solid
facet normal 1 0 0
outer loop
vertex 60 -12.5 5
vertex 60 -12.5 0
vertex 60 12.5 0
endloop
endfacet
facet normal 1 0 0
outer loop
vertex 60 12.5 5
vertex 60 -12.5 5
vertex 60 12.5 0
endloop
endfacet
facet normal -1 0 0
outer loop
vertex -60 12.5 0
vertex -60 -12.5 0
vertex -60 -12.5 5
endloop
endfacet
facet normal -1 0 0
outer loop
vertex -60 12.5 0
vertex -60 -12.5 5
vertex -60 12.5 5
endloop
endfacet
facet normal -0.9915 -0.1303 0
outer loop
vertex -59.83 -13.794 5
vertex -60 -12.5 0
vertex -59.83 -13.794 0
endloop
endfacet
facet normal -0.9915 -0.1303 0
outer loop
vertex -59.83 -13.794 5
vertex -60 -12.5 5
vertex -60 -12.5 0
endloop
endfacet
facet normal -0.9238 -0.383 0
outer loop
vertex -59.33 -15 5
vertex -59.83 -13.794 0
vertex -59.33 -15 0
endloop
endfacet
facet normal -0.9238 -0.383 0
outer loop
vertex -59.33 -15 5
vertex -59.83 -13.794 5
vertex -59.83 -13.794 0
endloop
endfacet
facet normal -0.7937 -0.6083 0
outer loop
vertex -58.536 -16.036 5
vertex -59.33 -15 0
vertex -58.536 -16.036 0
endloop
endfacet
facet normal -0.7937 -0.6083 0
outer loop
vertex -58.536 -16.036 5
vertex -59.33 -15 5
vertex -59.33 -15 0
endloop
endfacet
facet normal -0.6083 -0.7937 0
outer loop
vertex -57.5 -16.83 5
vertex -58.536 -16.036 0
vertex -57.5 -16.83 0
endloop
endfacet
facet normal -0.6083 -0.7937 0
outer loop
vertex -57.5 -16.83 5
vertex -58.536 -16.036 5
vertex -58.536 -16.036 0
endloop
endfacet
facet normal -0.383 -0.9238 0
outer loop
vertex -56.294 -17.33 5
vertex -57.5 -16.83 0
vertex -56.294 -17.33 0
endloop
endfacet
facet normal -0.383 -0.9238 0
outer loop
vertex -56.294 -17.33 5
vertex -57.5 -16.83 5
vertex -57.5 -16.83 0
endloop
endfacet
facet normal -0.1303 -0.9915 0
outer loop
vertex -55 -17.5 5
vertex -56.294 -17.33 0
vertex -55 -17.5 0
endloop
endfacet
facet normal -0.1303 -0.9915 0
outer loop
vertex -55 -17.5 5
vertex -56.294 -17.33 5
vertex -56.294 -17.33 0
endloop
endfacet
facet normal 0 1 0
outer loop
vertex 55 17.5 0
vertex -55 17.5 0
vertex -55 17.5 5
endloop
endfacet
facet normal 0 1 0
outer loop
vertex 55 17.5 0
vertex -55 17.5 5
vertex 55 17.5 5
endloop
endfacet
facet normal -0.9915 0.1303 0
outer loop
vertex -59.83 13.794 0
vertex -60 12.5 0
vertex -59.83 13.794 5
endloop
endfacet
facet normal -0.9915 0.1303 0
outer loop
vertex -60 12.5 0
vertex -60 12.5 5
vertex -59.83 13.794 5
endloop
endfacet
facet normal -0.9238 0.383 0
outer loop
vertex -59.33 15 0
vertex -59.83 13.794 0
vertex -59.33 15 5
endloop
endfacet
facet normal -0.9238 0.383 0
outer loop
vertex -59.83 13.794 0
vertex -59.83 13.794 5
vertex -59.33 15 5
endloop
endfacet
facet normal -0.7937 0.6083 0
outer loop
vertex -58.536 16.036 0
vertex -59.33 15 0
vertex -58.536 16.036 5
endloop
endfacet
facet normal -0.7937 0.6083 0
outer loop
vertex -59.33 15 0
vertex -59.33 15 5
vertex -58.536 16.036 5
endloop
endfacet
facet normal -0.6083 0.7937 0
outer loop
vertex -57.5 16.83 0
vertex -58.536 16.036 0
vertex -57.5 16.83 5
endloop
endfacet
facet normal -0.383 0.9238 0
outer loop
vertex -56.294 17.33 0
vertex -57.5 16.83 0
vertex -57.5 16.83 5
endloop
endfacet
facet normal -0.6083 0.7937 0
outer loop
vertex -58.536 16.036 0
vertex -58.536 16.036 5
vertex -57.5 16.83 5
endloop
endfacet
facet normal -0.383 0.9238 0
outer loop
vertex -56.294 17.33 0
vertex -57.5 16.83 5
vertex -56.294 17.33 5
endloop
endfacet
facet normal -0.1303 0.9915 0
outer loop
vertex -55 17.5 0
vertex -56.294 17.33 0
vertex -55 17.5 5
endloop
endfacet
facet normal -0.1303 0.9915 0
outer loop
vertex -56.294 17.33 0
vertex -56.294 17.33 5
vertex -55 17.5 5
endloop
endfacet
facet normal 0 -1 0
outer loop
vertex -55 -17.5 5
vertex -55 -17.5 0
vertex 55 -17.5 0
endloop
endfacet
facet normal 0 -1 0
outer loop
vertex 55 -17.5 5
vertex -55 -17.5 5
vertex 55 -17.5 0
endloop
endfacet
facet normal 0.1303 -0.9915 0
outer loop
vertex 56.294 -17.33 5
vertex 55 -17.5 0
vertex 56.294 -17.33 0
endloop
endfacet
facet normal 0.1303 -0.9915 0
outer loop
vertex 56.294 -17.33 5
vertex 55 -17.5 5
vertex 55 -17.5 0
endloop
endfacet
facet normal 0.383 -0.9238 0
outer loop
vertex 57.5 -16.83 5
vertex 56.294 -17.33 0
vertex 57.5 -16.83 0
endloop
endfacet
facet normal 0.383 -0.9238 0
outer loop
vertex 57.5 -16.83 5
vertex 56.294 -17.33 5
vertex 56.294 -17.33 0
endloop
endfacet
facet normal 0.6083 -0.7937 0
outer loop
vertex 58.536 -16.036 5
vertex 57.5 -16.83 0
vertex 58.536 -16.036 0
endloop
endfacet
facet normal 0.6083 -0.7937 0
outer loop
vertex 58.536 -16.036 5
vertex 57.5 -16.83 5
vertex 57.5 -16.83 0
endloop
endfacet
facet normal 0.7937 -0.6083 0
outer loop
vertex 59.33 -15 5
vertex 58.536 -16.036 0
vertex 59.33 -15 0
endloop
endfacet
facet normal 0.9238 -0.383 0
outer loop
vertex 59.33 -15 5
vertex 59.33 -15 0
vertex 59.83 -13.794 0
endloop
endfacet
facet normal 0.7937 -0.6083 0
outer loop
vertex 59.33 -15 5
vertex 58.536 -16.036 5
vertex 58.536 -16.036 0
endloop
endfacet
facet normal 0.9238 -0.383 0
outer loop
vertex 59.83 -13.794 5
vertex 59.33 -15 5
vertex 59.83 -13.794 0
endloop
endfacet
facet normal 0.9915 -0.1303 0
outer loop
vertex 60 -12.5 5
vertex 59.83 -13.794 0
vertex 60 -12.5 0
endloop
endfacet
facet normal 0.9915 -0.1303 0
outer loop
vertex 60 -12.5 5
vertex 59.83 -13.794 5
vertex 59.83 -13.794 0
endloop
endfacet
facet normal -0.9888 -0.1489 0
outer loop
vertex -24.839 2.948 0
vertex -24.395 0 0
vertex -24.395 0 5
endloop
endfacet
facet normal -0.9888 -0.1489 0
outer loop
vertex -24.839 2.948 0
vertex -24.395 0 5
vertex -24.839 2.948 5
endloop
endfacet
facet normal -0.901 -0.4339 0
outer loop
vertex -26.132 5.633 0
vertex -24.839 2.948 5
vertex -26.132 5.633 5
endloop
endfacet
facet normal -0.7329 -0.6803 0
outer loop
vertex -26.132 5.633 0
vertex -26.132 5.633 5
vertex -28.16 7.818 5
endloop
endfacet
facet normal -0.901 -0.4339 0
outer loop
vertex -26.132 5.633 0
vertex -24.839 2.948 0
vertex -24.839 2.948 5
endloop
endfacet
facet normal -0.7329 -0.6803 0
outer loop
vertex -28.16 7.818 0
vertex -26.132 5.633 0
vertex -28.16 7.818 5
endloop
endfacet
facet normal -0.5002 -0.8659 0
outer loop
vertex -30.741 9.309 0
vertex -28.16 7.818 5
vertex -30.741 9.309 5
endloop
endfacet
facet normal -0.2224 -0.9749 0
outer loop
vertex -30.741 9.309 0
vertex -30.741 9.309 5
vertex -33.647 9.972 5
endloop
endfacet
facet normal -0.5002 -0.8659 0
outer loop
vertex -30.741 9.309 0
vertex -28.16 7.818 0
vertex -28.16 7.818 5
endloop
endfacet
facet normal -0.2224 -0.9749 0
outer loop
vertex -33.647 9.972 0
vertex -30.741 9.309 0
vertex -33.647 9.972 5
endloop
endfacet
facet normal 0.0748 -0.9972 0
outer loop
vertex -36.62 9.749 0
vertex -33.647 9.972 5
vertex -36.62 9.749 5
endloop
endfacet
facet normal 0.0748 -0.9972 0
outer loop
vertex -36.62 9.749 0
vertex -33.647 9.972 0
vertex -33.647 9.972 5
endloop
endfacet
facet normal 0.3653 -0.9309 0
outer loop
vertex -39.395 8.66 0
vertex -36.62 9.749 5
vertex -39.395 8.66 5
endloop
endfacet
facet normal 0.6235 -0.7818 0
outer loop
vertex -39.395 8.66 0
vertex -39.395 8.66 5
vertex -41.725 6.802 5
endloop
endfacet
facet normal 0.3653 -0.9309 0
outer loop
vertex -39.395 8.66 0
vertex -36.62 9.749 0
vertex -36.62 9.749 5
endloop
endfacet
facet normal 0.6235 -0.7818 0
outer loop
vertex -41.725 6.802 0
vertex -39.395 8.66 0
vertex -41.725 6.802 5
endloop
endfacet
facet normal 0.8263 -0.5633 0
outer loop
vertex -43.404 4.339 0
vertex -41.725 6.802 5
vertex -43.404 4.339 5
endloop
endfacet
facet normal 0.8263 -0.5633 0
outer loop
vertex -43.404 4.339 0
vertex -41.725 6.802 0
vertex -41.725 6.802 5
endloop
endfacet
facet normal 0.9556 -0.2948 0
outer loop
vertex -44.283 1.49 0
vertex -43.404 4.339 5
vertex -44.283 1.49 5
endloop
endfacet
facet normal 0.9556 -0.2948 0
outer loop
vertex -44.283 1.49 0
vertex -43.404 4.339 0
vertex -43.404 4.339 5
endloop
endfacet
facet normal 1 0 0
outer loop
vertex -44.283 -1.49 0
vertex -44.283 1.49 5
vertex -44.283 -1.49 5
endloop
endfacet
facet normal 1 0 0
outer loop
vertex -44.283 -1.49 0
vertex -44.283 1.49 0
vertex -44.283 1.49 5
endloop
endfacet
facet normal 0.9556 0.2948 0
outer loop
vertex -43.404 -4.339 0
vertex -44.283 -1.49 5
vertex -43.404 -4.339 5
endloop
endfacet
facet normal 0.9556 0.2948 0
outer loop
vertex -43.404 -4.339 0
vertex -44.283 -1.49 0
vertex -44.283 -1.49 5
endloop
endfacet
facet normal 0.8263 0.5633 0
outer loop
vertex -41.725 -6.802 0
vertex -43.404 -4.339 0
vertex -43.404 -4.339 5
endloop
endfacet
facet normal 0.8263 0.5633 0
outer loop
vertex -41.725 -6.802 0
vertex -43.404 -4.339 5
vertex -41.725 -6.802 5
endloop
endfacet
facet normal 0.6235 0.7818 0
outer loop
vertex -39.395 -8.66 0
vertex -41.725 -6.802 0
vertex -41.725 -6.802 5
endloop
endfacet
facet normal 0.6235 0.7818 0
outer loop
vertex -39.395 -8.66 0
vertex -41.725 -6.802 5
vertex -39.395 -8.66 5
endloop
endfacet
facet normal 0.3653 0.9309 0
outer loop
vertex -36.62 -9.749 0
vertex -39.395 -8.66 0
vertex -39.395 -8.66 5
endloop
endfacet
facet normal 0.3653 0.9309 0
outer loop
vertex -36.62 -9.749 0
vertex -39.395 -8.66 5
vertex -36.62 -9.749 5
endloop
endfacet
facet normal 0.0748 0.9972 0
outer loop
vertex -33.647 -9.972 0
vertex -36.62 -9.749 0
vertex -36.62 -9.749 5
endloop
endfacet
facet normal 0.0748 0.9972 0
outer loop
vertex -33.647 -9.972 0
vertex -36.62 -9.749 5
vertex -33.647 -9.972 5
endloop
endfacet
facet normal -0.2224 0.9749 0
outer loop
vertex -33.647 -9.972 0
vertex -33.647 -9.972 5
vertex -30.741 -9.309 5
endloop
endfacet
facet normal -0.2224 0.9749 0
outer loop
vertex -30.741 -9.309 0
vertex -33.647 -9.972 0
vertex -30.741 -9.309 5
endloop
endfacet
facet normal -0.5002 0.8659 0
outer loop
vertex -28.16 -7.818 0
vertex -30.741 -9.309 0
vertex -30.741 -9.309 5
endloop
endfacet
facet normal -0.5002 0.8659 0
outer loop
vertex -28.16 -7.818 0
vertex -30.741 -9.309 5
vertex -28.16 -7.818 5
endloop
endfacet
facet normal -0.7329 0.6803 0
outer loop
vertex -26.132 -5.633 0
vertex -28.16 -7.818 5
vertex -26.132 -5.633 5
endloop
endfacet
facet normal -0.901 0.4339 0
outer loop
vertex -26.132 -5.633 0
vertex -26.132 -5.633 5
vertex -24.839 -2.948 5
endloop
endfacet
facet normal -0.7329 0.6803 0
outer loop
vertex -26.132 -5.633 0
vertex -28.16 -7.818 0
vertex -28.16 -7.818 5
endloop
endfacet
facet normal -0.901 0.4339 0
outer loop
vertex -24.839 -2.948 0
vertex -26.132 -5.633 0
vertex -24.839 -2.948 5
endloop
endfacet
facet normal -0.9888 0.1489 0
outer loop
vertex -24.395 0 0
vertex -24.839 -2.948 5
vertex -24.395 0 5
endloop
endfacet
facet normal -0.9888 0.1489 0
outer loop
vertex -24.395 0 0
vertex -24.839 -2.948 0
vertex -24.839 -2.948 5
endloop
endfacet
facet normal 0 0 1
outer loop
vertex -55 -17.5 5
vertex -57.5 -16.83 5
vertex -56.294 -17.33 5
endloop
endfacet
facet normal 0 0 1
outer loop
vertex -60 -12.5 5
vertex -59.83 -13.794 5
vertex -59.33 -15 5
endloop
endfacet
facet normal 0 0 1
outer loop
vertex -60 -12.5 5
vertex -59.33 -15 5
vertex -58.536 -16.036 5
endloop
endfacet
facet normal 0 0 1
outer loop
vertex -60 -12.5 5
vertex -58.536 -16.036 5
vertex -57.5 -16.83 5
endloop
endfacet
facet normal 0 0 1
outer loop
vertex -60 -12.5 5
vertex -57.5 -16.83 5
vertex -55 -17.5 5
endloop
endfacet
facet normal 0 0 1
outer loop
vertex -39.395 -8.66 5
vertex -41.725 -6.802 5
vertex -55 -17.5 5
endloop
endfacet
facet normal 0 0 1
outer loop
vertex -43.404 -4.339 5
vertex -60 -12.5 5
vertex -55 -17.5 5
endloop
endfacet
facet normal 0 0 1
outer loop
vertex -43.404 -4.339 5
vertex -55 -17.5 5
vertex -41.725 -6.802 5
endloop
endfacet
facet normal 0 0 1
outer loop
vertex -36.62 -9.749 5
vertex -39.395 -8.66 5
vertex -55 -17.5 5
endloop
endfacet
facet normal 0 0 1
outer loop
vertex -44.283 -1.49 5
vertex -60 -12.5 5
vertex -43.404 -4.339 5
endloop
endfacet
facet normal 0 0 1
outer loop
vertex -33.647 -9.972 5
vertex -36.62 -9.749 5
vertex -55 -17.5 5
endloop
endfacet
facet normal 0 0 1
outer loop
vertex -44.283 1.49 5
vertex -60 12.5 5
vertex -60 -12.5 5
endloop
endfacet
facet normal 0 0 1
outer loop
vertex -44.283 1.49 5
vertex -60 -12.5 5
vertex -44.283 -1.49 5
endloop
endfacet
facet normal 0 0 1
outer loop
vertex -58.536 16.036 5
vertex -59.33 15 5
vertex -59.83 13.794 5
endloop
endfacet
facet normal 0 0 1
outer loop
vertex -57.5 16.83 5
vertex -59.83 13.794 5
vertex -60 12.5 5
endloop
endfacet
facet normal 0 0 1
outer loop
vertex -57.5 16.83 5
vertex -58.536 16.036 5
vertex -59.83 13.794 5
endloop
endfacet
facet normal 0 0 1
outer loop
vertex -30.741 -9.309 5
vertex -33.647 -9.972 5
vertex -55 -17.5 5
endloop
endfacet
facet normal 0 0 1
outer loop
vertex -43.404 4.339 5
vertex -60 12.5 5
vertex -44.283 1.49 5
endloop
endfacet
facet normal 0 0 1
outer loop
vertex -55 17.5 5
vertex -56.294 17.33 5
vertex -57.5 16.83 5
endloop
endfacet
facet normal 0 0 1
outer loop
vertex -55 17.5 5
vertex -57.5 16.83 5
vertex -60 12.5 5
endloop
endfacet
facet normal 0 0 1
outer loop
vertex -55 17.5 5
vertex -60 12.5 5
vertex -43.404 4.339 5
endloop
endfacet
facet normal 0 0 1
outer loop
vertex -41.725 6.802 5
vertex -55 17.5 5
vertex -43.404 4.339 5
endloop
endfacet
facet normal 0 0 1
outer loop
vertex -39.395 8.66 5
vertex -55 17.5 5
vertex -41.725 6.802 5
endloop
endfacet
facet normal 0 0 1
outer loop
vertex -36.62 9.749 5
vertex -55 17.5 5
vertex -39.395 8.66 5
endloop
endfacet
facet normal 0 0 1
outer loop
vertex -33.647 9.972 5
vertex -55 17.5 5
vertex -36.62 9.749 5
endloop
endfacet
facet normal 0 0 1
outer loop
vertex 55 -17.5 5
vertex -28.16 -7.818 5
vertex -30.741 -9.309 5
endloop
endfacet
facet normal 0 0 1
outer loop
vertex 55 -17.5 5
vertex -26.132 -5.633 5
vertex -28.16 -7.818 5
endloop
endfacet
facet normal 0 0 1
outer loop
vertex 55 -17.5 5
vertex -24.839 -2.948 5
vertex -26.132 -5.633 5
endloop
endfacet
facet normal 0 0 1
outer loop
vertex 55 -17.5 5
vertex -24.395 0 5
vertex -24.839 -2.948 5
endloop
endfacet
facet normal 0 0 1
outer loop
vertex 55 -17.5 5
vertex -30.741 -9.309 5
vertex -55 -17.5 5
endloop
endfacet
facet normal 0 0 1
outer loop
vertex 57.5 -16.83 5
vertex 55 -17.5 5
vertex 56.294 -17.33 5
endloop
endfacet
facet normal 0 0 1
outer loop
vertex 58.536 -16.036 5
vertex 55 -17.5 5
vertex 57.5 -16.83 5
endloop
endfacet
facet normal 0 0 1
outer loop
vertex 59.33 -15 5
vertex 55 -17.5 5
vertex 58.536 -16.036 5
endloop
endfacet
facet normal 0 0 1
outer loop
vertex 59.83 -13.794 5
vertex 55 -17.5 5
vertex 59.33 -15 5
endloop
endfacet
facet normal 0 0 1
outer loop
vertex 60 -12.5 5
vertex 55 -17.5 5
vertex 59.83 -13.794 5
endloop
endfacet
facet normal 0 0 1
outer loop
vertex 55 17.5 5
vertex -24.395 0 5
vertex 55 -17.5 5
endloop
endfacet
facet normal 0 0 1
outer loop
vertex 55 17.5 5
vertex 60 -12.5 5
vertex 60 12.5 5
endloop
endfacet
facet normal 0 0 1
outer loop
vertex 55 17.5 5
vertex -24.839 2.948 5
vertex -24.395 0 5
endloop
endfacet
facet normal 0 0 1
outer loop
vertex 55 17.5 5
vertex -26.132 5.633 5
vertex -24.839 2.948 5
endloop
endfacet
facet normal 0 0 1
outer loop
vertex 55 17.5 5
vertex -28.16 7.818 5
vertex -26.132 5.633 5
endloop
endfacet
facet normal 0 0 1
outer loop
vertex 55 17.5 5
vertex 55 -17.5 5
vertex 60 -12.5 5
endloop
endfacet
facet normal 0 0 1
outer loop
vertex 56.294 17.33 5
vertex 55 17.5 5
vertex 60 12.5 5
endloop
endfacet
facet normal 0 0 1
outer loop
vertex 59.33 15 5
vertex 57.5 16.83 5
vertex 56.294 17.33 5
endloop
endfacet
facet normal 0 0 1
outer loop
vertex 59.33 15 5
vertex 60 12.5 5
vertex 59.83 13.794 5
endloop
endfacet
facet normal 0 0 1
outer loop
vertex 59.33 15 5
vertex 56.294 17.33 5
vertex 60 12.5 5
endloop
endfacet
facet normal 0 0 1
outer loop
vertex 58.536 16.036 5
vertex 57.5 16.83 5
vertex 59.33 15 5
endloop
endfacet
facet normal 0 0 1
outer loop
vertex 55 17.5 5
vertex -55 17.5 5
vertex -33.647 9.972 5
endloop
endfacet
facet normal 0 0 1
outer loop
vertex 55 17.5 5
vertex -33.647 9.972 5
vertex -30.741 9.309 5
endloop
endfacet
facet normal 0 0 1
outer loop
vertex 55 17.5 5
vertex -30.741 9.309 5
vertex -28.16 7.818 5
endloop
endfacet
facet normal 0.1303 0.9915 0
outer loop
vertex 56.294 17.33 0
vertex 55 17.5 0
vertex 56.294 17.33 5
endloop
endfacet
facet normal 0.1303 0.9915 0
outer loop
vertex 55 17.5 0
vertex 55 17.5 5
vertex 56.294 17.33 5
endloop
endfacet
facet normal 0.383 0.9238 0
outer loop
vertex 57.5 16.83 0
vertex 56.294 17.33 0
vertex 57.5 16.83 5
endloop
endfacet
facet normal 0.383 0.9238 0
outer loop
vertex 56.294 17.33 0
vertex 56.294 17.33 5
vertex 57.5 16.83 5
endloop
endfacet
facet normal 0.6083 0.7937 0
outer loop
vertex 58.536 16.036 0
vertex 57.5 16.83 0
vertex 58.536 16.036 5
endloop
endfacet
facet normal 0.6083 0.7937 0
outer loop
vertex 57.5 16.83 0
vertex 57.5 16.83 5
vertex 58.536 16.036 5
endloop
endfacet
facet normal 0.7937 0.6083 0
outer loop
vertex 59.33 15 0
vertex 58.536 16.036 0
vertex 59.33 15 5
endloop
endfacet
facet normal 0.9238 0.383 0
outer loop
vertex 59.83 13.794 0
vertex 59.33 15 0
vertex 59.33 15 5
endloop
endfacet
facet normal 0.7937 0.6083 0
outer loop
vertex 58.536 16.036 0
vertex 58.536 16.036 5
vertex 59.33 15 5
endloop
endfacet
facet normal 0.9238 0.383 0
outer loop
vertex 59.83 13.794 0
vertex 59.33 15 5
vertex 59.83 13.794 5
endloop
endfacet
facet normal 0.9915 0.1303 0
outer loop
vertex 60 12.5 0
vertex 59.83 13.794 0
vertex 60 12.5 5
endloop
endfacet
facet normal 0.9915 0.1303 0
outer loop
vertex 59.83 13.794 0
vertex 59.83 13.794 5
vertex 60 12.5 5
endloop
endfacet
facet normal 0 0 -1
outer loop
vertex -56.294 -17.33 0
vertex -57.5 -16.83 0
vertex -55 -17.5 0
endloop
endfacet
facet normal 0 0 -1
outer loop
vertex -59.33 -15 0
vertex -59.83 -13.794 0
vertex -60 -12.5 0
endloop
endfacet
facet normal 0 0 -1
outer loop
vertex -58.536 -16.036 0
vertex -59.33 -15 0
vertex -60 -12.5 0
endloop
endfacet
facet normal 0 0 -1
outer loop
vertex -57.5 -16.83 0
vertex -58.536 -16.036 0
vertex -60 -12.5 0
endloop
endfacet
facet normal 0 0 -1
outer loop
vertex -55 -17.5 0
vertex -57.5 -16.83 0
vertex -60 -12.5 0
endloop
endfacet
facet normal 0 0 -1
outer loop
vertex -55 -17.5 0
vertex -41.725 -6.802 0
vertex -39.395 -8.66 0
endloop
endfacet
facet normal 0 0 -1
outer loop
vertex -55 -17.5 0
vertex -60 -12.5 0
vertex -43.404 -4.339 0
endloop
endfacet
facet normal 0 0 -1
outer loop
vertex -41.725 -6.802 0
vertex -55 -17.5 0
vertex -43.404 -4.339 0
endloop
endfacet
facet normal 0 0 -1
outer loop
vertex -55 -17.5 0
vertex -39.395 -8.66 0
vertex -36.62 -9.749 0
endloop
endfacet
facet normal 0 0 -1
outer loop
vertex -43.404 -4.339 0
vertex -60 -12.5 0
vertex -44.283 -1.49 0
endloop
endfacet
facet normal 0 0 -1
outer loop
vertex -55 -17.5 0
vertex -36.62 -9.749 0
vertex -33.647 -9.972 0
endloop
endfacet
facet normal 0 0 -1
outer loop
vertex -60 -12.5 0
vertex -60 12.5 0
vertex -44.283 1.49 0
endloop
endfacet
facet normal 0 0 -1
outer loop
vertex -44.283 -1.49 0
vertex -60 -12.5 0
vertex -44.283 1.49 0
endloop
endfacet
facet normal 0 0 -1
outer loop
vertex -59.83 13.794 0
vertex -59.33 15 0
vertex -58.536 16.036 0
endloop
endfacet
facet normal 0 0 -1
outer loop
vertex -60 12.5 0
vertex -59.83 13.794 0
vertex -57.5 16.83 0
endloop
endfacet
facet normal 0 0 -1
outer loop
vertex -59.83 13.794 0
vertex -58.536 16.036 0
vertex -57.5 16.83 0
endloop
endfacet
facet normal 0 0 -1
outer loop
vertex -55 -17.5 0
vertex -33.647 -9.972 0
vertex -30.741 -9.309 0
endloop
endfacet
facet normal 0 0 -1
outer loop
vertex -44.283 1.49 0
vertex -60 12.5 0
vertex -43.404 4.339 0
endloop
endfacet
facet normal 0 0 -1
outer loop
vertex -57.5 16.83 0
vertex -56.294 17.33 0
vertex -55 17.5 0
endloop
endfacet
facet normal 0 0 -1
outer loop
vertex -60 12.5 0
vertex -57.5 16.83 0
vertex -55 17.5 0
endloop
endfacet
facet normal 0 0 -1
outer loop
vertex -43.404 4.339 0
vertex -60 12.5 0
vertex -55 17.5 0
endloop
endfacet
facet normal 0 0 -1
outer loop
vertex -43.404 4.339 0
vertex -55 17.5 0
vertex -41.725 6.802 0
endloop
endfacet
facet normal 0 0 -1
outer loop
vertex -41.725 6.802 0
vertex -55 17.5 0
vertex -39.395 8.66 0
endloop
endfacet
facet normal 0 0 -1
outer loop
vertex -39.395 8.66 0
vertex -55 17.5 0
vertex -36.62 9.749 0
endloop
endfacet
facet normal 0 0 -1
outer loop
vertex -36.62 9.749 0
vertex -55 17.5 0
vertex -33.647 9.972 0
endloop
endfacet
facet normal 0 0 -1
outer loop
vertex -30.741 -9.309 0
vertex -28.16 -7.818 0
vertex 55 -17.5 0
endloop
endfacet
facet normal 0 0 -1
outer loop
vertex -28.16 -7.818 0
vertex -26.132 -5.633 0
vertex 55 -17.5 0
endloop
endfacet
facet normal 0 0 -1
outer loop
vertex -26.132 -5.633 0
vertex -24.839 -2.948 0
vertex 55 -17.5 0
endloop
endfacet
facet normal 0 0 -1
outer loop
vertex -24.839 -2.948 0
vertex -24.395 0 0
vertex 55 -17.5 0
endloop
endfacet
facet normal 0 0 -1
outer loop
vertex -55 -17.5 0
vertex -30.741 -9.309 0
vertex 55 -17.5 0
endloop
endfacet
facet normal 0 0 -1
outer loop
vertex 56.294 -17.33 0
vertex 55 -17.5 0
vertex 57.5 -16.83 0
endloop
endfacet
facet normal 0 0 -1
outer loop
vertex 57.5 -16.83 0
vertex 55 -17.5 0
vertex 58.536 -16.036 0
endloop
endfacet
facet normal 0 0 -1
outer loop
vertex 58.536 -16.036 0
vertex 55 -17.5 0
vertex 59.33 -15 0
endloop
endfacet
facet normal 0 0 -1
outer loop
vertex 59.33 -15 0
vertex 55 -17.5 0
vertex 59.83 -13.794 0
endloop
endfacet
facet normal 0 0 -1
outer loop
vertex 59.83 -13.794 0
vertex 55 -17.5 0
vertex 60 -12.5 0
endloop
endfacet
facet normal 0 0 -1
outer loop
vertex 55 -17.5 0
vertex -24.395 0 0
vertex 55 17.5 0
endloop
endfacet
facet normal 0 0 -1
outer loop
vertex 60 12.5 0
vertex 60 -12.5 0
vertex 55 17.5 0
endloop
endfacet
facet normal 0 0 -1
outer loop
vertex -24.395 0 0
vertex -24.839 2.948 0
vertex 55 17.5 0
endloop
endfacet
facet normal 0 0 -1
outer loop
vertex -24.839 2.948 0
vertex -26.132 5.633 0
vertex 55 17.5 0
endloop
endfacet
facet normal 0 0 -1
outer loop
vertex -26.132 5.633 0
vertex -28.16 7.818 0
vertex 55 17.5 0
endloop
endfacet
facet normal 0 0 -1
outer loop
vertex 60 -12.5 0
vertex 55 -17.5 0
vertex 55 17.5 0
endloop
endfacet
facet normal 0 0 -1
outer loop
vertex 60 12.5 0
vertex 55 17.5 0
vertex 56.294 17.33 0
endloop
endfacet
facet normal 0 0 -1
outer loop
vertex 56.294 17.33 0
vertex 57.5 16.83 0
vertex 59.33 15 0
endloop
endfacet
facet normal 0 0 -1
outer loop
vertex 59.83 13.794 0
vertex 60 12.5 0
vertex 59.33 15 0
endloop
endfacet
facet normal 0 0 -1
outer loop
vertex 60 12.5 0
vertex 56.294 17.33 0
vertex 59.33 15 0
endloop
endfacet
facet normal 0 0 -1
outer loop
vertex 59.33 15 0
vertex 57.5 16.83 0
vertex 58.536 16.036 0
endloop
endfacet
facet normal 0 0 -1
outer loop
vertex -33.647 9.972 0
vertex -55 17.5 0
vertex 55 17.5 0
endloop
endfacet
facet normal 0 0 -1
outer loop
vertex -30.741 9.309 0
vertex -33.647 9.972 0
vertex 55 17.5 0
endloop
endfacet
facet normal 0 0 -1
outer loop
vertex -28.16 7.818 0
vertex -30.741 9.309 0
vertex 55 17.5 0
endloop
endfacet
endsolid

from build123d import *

# Parameters (mm, degrees)
F0_W     = 120
F0_H     = 35
F0_R     = 10
F1_DEPTH = 5
F2_R     = 5


with BuildPart() as f1:
    # F0 (on Top) → F1 (new body)
    with BuildSketch(Plane.XY):
        Rectangle(F0_W, F0_H)
        with Locations((-34.394763, 0)):
            Circle(F0_R, mode=Mode.SUBTRACT)
    extrude(amount=F1_DEPTH)

    # F2
    f2_edges = [f1.edges().sort_by_distance(p)[0] for p in [
        (-60, -17.5, 2.5),
        (60, 17.5, 2.5),
        (60, -17.5, 2.5),
        (-60, 17.5, 2.5),
    ]]
    fillet(f2_edges, radius=F2_R)


solid = f1.part
